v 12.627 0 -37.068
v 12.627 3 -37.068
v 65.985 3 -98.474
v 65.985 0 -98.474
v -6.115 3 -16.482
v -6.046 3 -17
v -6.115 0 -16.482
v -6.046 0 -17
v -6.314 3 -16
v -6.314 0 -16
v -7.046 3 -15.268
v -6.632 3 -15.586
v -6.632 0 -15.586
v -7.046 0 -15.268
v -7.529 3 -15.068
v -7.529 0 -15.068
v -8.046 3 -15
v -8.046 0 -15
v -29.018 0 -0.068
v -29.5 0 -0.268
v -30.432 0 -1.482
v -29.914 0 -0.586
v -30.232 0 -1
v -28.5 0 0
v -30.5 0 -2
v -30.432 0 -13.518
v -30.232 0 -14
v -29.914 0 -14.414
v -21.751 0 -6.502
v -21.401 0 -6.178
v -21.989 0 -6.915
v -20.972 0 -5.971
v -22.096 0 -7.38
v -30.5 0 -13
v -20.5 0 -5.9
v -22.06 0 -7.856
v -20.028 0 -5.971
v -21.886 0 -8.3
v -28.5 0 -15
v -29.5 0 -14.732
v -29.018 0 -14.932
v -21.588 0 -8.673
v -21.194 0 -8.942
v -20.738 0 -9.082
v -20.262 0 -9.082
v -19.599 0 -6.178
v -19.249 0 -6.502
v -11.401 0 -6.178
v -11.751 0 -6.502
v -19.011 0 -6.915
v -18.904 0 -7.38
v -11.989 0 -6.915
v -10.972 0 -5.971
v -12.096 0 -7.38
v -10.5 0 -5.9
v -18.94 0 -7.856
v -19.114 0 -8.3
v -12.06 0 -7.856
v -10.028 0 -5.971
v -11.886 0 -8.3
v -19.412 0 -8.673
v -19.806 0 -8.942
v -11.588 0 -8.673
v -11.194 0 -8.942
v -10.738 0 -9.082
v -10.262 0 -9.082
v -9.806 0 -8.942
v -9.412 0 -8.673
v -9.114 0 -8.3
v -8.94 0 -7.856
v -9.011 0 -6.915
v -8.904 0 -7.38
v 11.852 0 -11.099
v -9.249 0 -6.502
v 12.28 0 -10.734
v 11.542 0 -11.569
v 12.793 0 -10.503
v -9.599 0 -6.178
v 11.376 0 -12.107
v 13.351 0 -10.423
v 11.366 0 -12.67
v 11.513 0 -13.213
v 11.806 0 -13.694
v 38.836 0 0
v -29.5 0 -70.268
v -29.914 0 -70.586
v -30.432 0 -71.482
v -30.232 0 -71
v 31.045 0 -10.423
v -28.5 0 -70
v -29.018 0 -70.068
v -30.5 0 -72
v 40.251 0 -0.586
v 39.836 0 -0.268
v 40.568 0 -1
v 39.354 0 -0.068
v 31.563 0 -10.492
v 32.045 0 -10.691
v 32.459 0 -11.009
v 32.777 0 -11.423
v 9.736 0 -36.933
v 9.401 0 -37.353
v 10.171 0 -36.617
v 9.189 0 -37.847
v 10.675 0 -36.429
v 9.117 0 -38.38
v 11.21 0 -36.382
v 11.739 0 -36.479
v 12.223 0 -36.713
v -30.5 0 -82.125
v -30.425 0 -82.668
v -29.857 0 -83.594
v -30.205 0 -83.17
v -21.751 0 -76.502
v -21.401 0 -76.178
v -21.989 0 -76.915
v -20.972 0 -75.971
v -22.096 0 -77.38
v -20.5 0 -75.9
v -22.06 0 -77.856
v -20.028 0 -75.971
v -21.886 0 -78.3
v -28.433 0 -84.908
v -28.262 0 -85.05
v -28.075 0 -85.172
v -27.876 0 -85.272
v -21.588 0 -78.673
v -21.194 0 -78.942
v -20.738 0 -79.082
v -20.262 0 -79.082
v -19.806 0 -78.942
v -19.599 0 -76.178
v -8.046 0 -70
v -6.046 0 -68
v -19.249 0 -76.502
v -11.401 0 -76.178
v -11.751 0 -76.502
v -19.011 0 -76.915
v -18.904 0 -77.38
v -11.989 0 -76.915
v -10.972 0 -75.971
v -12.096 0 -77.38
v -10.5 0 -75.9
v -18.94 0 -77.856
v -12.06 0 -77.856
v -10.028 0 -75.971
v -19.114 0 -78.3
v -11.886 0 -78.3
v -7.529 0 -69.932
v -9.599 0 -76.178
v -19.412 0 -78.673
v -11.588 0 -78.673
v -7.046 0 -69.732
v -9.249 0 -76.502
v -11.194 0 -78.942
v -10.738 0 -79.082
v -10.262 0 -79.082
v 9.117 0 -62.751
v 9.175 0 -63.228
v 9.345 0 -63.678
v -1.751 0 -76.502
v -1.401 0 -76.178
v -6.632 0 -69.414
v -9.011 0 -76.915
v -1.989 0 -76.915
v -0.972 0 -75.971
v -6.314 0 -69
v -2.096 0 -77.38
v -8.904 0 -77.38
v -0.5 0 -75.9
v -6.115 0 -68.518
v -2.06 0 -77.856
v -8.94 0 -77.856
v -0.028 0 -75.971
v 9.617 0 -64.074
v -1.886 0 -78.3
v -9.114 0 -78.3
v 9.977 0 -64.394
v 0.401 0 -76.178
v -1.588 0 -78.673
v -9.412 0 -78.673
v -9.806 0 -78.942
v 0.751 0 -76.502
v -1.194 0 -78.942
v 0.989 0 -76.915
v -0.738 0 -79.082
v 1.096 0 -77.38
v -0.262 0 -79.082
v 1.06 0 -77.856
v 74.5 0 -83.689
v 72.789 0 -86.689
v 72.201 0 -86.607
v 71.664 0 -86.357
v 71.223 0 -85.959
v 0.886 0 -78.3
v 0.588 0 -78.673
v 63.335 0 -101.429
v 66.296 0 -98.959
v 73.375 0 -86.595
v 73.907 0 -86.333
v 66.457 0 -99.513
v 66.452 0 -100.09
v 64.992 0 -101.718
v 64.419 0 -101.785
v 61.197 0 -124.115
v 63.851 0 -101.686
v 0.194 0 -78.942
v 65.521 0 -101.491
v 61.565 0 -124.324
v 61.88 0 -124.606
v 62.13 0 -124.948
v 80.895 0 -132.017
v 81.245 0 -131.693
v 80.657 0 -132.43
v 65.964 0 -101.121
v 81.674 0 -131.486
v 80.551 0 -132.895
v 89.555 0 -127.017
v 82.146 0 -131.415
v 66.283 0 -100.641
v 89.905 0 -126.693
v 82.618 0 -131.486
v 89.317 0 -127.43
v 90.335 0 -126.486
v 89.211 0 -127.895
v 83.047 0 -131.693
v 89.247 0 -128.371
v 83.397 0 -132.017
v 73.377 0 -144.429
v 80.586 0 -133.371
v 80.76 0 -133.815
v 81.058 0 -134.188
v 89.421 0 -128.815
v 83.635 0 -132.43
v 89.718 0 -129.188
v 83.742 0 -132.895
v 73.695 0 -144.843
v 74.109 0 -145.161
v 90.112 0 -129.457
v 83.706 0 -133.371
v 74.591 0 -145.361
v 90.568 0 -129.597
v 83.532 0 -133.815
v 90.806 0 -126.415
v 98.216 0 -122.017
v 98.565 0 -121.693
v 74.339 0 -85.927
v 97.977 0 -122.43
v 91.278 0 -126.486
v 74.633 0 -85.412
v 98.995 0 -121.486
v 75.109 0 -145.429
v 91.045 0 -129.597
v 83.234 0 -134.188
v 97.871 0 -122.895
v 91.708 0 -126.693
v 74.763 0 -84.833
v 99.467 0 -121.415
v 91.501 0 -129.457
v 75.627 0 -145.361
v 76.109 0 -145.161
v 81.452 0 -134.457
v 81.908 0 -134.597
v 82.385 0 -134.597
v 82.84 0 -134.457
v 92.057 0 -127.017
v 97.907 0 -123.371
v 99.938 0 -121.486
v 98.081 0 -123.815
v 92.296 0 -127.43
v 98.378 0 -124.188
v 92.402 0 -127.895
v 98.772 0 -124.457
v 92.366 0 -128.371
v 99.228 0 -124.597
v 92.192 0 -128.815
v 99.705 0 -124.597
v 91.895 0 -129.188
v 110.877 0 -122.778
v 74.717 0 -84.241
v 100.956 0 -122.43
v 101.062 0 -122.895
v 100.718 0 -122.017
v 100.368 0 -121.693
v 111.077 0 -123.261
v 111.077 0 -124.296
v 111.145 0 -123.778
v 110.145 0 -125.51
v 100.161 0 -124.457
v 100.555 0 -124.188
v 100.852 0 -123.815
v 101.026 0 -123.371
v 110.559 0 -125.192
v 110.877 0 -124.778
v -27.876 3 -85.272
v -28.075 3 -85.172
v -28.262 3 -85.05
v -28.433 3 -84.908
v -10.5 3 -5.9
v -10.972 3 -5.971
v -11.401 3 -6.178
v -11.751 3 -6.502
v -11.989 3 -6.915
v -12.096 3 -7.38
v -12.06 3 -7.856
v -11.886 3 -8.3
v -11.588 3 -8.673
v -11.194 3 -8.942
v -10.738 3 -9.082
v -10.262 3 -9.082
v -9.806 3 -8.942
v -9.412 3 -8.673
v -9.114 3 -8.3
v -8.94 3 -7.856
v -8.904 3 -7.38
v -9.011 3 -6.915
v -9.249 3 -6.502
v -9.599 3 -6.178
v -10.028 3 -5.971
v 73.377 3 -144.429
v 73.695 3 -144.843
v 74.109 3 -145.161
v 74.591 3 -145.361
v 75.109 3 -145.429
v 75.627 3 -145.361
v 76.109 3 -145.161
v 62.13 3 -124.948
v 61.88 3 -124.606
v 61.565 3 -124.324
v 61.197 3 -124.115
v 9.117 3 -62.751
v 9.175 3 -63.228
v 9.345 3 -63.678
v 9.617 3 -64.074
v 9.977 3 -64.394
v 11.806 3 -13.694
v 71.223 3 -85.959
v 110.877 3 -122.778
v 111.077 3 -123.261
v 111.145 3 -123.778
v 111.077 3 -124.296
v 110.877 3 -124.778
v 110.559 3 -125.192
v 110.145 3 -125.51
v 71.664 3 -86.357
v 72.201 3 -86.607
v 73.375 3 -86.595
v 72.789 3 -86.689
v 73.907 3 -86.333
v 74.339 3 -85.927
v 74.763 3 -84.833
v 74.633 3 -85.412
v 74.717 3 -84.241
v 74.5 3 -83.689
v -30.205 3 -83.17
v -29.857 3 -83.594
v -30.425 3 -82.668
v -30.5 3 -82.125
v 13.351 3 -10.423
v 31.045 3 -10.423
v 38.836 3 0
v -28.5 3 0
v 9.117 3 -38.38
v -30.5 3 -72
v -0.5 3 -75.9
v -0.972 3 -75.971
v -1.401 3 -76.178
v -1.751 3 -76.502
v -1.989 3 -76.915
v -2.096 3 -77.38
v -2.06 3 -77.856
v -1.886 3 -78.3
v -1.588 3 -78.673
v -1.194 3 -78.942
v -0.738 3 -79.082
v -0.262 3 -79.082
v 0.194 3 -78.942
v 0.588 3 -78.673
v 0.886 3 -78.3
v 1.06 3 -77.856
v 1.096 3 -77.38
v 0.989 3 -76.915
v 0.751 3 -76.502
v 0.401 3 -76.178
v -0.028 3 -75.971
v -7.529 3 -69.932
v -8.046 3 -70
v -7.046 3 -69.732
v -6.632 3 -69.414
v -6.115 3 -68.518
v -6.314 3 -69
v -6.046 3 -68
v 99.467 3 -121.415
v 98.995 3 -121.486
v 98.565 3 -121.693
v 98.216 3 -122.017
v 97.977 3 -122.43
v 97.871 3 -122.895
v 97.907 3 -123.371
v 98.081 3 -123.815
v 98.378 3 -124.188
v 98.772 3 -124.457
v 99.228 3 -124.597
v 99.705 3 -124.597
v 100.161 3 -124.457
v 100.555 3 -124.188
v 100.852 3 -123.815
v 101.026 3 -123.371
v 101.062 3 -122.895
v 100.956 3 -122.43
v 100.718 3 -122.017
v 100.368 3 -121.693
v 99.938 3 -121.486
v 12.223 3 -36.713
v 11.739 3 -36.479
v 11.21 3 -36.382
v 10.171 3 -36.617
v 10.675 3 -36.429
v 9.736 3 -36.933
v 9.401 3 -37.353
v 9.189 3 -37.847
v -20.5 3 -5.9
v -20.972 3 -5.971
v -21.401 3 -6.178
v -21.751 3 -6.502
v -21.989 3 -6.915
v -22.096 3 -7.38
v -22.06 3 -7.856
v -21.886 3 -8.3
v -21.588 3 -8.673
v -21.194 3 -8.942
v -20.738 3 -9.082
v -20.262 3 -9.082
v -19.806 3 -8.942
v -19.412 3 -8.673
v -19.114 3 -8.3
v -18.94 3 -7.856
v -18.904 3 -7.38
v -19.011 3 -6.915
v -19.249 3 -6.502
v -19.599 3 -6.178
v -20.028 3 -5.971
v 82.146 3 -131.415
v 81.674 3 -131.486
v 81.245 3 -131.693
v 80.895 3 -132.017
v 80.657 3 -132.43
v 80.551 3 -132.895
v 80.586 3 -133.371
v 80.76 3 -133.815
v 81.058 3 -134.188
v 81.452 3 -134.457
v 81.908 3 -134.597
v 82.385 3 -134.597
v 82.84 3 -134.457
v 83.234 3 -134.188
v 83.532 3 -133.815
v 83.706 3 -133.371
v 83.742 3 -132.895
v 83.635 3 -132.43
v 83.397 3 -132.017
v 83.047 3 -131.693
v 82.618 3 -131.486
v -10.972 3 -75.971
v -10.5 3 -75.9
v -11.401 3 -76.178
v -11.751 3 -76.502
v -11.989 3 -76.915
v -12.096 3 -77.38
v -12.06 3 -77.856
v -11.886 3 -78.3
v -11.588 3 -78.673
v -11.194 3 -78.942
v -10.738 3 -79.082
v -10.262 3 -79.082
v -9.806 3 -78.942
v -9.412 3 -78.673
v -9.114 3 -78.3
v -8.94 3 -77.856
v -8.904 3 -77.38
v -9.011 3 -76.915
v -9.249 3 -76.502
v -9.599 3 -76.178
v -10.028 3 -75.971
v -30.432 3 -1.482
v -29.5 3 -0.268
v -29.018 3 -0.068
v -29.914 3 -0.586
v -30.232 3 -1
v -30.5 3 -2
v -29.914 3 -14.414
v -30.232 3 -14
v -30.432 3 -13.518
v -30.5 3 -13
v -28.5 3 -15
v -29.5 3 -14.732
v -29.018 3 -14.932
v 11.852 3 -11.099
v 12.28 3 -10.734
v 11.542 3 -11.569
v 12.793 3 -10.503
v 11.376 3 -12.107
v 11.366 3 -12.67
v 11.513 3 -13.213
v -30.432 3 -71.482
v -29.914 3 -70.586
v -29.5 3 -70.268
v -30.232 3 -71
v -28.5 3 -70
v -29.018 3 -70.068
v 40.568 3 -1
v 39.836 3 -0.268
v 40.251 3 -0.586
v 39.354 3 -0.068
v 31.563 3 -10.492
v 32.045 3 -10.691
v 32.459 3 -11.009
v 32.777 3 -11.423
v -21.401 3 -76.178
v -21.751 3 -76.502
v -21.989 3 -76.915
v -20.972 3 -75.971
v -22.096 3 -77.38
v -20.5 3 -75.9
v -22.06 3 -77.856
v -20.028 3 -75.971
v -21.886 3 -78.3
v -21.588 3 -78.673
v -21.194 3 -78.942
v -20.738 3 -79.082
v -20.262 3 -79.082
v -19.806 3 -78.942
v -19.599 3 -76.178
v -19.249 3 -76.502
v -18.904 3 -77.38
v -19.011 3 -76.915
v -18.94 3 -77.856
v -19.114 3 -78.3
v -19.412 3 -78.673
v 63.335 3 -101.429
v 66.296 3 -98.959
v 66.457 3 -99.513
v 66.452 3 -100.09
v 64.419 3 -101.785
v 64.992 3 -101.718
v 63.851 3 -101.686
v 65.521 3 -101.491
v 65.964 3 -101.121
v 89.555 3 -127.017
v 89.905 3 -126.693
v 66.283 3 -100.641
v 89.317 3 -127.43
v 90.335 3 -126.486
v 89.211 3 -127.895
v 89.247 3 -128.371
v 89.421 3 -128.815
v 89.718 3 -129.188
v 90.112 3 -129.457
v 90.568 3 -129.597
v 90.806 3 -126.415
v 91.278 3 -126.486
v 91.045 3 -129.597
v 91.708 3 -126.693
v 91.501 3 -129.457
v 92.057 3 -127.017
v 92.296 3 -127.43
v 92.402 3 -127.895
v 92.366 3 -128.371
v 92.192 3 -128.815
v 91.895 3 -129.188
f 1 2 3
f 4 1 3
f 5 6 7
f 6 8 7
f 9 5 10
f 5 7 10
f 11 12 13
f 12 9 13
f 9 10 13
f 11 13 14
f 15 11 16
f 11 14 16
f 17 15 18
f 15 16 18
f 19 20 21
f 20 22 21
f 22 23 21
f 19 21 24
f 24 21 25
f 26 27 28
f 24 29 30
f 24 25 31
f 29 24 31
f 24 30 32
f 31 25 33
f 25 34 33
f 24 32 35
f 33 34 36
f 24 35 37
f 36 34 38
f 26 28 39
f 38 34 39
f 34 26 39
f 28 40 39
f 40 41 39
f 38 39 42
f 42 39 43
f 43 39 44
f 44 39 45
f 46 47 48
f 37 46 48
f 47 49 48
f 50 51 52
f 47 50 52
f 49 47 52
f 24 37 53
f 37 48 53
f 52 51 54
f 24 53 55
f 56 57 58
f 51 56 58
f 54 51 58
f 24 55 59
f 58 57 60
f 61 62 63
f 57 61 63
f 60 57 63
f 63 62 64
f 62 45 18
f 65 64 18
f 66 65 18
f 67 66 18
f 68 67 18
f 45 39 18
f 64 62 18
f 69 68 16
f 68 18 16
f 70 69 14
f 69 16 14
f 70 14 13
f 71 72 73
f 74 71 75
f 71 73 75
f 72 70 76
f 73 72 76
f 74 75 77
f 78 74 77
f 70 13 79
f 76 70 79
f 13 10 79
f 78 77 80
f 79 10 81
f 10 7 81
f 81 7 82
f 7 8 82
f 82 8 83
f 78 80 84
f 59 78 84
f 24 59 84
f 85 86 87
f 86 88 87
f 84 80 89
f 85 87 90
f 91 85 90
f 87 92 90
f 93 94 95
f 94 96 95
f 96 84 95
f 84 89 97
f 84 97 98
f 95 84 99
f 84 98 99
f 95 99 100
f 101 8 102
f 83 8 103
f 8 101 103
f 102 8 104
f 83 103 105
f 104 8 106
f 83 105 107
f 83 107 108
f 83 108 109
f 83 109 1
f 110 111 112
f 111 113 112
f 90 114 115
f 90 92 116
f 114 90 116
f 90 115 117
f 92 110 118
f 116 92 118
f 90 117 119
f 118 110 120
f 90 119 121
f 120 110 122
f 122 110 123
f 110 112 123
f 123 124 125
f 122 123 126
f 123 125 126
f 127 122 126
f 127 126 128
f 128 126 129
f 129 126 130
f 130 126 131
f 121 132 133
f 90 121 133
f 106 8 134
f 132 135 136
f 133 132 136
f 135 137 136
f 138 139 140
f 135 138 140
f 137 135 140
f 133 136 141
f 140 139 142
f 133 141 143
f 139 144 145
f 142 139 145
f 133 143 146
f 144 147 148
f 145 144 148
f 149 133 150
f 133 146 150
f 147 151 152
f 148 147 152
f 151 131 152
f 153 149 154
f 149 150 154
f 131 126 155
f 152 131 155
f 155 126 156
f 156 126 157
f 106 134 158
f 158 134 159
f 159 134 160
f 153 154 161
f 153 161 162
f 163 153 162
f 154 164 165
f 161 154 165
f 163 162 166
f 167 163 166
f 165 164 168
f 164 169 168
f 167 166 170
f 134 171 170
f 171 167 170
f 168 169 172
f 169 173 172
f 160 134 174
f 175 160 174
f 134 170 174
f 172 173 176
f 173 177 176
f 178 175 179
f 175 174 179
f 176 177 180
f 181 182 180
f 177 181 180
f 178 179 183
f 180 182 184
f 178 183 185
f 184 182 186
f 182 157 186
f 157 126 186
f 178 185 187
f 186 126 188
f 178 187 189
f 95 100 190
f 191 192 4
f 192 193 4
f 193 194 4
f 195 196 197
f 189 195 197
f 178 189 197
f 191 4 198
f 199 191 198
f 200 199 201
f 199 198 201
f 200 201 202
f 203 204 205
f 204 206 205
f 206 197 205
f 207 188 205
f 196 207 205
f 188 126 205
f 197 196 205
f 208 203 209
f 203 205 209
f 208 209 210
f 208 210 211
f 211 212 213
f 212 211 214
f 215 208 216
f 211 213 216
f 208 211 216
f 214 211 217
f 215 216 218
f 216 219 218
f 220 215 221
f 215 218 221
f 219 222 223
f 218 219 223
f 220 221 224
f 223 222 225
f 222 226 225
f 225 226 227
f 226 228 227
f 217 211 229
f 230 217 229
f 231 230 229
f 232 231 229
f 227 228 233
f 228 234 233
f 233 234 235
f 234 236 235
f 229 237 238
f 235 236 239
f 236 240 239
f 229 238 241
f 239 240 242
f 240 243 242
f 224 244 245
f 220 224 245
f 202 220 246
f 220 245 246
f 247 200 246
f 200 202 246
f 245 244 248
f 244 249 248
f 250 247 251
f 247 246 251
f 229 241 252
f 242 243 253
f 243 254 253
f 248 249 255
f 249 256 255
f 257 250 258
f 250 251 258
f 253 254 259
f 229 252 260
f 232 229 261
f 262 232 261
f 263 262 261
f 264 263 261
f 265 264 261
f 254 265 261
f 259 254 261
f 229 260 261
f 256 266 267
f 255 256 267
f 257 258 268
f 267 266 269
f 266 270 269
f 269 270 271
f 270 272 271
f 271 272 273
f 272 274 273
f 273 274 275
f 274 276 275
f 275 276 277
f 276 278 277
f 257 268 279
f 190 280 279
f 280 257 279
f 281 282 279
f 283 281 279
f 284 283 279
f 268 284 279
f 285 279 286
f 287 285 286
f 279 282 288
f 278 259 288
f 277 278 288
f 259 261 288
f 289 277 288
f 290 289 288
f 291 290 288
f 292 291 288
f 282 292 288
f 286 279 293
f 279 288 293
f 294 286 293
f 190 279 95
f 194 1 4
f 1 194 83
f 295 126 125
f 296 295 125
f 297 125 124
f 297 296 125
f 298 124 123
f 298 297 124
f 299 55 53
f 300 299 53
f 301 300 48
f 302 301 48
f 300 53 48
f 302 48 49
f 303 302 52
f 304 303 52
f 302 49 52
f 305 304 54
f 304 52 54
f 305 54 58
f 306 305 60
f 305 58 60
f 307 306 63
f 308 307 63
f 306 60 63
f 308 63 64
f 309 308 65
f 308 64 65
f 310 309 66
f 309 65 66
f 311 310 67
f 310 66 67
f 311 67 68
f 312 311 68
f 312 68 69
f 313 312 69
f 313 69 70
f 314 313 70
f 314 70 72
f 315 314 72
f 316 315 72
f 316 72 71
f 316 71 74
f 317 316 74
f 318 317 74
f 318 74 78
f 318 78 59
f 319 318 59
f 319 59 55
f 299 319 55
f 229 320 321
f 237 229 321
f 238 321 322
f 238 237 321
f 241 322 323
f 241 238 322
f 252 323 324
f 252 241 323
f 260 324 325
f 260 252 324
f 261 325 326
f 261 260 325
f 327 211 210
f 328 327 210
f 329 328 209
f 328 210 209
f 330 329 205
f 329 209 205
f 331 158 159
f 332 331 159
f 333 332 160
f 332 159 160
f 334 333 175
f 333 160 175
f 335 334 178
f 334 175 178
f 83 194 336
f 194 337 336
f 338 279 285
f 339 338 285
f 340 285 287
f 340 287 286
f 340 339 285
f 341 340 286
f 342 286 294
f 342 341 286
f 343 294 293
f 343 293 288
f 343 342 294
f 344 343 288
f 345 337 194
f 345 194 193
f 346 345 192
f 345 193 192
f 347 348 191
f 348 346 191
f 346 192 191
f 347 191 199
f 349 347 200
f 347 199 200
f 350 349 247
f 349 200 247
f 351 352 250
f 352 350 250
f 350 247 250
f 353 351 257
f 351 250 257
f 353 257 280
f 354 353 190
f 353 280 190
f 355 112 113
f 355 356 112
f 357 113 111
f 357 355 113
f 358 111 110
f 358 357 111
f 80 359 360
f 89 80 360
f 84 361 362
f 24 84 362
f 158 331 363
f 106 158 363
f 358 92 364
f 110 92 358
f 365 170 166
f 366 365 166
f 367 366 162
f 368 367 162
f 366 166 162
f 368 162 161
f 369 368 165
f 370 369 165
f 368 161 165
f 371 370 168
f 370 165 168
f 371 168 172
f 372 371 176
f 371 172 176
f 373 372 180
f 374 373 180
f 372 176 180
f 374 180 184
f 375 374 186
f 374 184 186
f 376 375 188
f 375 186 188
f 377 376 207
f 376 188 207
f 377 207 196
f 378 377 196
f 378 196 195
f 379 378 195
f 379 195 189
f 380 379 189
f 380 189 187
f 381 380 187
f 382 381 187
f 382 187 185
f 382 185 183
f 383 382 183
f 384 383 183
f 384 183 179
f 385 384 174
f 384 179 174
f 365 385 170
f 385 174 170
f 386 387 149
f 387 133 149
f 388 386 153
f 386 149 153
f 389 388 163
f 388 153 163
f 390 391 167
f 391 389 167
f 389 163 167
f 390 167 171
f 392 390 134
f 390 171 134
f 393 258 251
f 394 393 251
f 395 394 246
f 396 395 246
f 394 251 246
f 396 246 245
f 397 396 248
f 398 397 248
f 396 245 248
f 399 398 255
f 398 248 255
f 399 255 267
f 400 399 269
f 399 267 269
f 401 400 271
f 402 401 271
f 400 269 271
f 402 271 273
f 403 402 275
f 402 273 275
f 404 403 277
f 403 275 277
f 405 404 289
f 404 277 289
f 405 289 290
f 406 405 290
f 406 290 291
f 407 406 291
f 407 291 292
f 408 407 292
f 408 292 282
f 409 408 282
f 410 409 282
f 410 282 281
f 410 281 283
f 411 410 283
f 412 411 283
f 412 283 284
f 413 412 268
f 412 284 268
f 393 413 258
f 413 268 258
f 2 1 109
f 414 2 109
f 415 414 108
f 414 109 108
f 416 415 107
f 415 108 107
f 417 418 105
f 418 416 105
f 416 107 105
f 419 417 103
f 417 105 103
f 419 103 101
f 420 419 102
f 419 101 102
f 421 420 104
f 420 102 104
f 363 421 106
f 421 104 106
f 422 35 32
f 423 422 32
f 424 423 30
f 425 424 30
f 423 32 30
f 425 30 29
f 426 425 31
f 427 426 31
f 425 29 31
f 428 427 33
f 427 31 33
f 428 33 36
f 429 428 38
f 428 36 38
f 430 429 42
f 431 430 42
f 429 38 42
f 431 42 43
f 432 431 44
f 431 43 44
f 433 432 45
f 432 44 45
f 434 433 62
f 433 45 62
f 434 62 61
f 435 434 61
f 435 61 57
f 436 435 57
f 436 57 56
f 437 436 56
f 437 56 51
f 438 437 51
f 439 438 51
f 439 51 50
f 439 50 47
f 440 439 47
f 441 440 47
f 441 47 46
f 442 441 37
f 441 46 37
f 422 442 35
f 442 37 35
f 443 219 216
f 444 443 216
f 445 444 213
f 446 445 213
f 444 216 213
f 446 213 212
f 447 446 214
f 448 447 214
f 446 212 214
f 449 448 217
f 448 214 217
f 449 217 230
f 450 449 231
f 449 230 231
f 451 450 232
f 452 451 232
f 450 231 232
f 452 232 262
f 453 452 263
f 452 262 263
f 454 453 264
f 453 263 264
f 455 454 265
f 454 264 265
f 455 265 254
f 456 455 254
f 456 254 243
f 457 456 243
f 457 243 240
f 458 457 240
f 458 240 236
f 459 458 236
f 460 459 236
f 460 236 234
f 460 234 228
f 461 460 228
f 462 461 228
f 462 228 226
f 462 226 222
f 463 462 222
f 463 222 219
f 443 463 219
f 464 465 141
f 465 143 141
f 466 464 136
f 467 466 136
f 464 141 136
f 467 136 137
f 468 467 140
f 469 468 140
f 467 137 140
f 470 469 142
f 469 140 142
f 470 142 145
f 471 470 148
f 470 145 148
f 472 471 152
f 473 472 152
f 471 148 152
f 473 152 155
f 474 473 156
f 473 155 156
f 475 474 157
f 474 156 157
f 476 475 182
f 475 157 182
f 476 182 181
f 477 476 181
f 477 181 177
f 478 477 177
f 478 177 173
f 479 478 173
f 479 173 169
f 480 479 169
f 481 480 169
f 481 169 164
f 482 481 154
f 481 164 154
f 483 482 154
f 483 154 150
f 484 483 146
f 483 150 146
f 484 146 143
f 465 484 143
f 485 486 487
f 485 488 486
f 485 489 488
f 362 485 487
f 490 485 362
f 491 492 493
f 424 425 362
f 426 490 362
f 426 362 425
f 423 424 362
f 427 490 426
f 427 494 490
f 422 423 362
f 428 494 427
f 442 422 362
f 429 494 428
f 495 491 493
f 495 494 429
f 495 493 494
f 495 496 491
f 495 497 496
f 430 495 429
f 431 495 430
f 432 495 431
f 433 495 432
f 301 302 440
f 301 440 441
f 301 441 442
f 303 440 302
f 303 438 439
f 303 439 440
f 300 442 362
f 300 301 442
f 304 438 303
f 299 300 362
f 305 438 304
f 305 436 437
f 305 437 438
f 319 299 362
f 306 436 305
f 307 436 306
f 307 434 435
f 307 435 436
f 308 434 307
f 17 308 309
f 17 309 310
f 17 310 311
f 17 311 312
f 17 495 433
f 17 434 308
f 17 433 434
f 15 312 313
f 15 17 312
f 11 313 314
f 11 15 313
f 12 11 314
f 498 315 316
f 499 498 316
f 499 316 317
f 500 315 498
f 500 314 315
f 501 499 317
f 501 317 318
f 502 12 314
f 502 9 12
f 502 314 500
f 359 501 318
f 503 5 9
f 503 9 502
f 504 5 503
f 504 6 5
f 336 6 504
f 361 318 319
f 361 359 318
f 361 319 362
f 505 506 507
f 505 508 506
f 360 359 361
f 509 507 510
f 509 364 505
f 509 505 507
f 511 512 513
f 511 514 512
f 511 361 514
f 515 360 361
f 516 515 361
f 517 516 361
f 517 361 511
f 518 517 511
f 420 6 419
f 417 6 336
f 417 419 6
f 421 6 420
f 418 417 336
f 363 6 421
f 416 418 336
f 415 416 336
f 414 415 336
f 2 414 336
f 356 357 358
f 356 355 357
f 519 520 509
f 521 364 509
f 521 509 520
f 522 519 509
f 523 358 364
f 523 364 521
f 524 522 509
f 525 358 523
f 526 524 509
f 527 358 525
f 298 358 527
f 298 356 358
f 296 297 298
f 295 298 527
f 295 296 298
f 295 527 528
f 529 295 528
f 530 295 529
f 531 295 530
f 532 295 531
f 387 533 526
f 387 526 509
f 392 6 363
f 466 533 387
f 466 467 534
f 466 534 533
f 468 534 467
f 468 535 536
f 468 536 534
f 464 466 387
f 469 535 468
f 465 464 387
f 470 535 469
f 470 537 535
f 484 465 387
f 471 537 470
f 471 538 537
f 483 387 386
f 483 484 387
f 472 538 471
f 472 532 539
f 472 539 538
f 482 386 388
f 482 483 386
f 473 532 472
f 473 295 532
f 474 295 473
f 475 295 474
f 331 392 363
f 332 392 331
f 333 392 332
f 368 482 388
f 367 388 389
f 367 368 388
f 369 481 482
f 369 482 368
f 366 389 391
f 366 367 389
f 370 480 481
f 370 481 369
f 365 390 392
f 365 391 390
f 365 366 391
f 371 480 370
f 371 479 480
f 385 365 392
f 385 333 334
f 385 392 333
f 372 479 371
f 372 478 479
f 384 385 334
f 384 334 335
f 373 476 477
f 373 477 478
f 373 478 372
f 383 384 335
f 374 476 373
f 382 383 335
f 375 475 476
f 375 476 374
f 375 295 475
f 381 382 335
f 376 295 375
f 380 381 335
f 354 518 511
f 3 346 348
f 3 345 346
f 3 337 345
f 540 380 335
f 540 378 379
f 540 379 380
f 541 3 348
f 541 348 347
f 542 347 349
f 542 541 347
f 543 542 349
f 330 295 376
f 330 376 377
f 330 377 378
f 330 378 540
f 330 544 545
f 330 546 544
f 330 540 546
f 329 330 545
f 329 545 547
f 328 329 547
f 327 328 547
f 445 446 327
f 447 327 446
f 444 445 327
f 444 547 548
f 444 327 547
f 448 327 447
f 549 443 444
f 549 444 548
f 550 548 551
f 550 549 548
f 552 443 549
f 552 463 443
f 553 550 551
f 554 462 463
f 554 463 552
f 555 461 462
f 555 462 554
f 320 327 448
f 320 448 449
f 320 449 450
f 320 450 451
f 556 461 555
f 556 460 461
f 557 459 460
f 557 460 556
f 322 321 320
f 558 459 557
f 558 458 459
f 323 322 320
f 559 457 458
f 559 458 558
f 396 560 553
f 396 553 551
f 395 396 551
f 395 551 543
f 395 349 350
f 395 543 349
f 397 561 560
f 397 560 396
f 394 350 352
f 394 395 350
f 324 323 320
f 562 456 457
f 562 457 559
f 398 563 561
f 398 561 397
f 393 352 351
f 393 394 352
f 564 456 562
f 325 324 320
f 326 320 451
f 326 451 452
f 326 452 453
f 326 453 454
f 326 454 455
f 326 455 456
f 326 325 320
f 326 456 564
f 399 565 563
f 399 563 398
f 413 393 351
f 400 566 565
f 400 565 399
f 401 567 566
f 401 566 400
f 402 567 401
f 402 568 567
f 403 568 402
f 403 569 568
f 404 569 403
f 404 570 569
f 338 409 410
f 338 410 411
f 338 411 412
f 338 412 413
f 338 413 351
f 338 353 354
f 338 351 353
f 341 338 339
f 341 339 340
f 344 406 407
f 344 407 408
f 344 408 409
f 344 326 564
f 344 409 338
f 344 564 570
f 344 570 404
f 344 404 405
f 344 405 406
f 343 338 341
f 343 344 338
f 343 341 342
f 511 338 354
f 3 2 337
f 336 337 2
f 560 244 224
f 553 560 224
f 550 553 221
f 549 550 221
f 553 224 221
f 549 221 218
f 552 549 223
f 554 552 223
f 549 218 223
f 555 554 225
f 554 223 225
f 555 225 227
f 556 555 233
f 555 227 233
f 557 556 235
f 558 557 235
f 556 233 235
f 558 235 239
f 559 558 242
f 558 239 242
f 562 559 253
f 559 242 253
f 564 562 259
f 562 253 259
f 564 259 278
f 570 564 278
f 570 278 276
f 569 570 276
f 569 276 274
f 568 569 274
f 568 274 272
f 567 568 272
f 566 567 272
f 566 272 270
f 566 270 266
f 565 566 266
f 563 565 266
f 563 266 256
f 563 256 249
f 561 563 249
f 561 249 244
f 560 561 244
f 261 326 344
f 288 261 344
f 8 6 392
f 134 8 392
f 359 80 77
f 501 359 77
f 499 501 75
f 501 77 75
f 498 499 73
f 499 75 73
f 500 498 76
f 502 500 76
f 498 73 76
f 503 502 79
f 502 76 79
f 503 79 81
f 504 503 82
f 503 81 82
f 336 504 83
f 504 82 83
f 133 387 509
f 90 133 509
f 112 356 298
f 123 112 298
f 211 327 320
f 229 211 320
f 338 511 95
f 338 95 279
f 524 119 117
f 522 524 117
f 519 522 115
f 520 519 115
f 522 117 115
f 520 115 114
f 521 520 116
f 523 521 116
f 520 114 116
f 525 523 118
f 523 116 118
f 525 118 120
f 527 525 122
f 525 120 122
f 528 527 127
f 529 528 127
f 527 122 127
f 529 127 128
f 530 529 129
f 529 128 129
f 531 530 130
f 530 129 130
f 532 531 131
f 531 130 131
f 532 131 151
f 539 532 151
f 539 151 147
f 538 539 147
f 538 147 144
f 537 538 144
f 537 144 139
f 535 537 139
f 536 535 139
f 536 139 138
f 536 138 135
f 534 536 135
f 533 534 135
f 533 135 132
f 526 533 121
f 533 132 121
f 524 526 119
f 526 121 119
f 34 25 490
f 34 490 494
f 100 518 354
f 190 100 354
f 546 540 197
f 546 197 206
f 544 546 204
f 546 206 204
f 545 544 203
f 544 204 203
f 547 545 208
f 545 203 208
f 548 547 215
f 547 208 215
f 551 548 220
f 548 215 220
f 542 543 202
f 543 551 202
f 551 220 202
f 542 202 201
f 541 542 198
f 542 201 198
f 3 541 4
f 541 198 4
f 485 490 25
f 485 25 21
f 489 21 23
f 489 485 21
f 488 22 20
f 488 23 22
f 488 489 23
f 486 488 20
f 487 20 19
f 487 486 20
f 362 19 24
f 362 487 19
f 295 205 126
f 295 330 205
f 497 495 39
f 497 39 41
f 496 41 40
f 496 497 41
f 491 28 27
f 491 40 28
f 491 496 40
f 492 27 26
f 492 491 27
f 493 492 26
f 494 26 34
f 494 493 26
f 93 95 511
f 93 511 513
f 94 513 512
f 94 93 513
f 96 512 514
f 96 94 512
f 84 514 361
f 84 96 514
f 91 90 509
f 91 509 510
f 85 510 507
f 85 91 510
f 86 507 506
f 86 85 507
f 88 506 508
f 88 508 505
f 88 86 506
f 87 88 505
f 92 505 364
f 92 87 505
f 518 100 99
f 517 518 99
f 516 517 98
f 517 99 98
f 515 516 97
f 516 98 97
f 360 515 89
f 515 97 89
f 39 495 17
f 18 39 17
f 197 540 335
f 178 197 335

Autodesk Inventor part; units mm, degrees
ref_plane "YZ Plane" through (0, 0, 0) normal (1, 0, 0) x (0, 1, 0)
ref_plane "XZ Plane" through (0, 0, 0) normal (0, 1, 0) x (-1, 0, 0)
ref_plane "XY Plane" through (0, 0, 0) normal (0, 0, 1) x (1, 0, 0)
sketch "スケッチ1" plane through (0, 0, 0) normal (0, 1, 0) x (-1, 0, 0)
  line L0 (0, 0) -> (30.5, 0)
  line L1 (30.5, 0) -> (30.5, -85)
  line L2 (30.5, -85) -> (0, -85)
  line L3 (0, -85) -> (0, 0)
  dimension "d0" = 30.5
  dimension "d1" = 85
extrude "押し出し1" add sketch "スケッチ1" along normal blind 3
sketch "スケッチ2" plane through (0, 3, 0) normal (0, 1, 0) x (1, 0, 0)
  line L0 (-30.5464, 15) -> (-6.0464, 15)
  line L1 (-6.0464, 15) -> (-6.0464, 70)
  line L2 (-6.0464, 70) -> (-30.5464, 70)
  line L3 (-30.5, 0) -> (0, 0) projected
  line L4 (-30.5464, 15) -> (-30.5464, 70)
  dimension "d4" = 24.5
  dimension "d5" = 55
  dimension "d6" = 90
  dimension "d7" = 15
extrude "押し出し2" cut sketch "スケッチ2" against normal blind 3
fillet "フィレット1" radius 2 4 edges at (-30.5, 1.5, 0) (-30.5, 1.5, -70) (-30.5, 1.5, -85) (-30.5, 1.5, -15)
fillet "フィレット2" radius 2 2 edges at (-6.0464, 1.5, -15) (-6.0464, 1.5, -70)
sketch "スケッチ3" plane through (0, 3, 0) normal (0, 1, 0) x (1, 0, 0)
  line L0 (-28.5, 0) -> (0, 0) projected
  line L1 (0, 0) -> (100, 0)
  line L2 (100, 0) -> (100, 85)
  line L3 (100, 85) -> (0, 85)
  line L4 (0, 85) -> (0, 0)
  dimension "d12" = 100
  dimension "d13" = 85
extrude "押し出し3" add sketch "スケッチ3" against normal blind 3
sketch "スケッチ4" plane through (0, 3, 0) normal (0, 1, 0) x (1, 0, 0)
  line L0 (100, 0) -> (100, 85) projected
  point P0 (0, 0)
  point P1 (40, 0)
  dimension "d16" = 60
sketch "スケッチ5" plane through (0, 3, 0) normal (0, 1, 0) x (1, 0, 0)
  line L0 (-28.5, 0) -> (100, 0) projected
  line L1 (39.9909, 0) -> (111.8004, 124.3777)
  line L2 (39.9909, 0) -> (183.6099, 0) construction
  line L3 (111.8004, 124.3777) -> (61.8004, 124.3777)
  line L4 (61.8004, 124.3777) -> (-28.5, 85)
  line L5 (-28.5, 85) -> (89.0656, 85)
  line L6 (100, 85) -> (-28.5, 85) projected
  point P0 (0, 0)
  dimension "d17" = 143.619
  dimension "d18" = 60
  dimension "d19" = 50
extrude "押し出し4" add sketch "スケッチ5" against normal blind 3
sketch "スケッチ6" plane through (0, 3, 0) normal (0, 1, 0) x (1, 0, 0)
  line L0 (111.8004, 124.3777) -> (61.8004, 124.3777) projected
  line L1 (111.8004, 124.3777) -> (111.8004, 0)
  line L2 (111.8004, 124.3777) -> (236.1781, 124.3777) construction
  line L3 (100, 0) -> (100, 85) projected
  line L4 (111.8004, 0) -> (100, 0)
  line L5 (100, 0) -> (100, 85)
  line L6 (100, 85) -> (89.0656, 85) projected
  line L7 (100, 85) -> (89.0656, 85)
  line L8 (89.0656, 85) -> (111.8004, 124.3777) projected
  line L9 (89.0656, 85) -> (111.8004, 124.3777)
  point P0 (0, 0)
  dimension "d22" = 90
extrude "押し出し5" add sketch "スケッチ6" against normal blind 3
sketch "スケッチ7" plane through (0, 3, 0) normal (0, 1, 0) x (1, 0, 0)
  line L0 (111.8004, 124.3777) -> (111.8004, 0) projected
  line L1 (111.8004, 109.3777) -> (39.991, 0)
  line L2 (-28.5, 0) -> (111.8004, 0) projected
  line L3 (111.8004, 0) -> (111.8004, 109.3777)
  line L4 (111.8004, 0) -> (39.991, 0)
  point P0 (0, 0)
  dimension "d25" = 15
extrude "押し出し6" cut sketch "スケッチ7" against normal blind 3
sketch "スケッチ8" plane through (0, 3, 0) normal (0, 1, 0) x (1, 0, 0)
  line L0 (111.8004, 109.3777) -> (111.8004, 124.3777) projected
  point P0 (0, 0)
  point P1 (111.8004, 116.8777)
sketch "スケッチ9" plane through (0, 3, 0) normal (0, 1, 0) x (1, 0, 0)
  point P0 (0, 0)
sketch "スケッチ10" plane through (0, 3, 0) normal (0, 1, 0) x (1, 0, 0)
  line L0 (111.8004, 109.3777) -> (39.991, 0) projected
  line L1 (61.8004, 124.3777) -> (111.8004, 124.3777) projected
  line L2 (39.991, 0) -> (111.8004, 124.3777)
  line L3 (111.8004, 109.3777) -> (111.8004, 124.3777) projected
  line L4 (111.8004, 124.3777) -> (111.8004, 109.3777)
  line L5 (111.8004, 109.3777) -> (39.991, 0)
  point P0 (0, 0)
extrude "押し出し7" cut sketch "スケッチ10" against normal blind 3
sketch "スケッチ11" plane through (0, 3, 0) normal (0, 1, 0) x (1, 0, 0)
  line L0 (61.8004, 124.3777) -> (74.3769, 146.1608)
  line L1 (61.8004, 124.3777) -> (86.9534, 124.3777) construction
  line L2 (74.3769, 146.1608) -> (112.1064, 124.3777)
  line L3 (111.8004, 124.3777) -> (61.8004, 124.3777) projected
  line L4 (112.1064, 124.3777) -> (61.8004, 124.3777)
  point P0 (0, 0)
  dimension "d32" = 25.153
  dimension "d33" = 60
extrude "押し出し8" add sketch "スケッチ11" against normal blind 3
fillet "フィレット3" radius 2 2 edges at (112.1064, 1.5, -124.3777) (111.8004, 1.5, -124.3777)
fillet "フィレット4" radius 2 3 edges at (74.3769, 1.5, -146.1608) (61.8004, 1.5, -124.3777) (39.991, 1.5, 0)
sketch "スケッチ12" plane through (0, 3, 0) normal (0, 1, 0) x (1, 0, 0)
  circle A0 centre (99.4666, 123.015) radius 1.6
  line L0 (110.1448, 125.5102) -> (76.1089, 145.1608) projected
  line L1 (40.5683, 1) -> (110.8769, 122.7782) projected
  circle A1 centre (89.4666, 128.7885) radius 1.6
  circle A2 centre (79.4666, 134.562) radius 1.6
  point P0 (0, 0)
  dimension "d38" = 3.2
  dimension "d39" = 7.5
  dimension "d40" = 10
  dimension "d41" = 3.2
  dimension "d42" = 3.2
  dimension "d43" = 10
  dimension "d44" = 7.5
  dimension "d45" = 7.5
  dimension "d46" = 10
hole "穴1" at (99.4666, 3, -123.015) at (89.4666, 3, -128.7885) at (79.4666, 3, -134.562) direction (0, -1, 0) diameter 3.2 depth 3.048
fillet "フィレット5" radius 2 1 edges at (-28.5, 1.5, -85)
sketch "スケッチ13" plane through (0, 3, 0) normal (0, 1, 0) x (1, 0, 0)
  line L0 (-30.5, 83) -> (-30.5, 72) projected
  line L1 (-28.1853, 85.1373) -> (61.1969, 124.1146) projected
  line L2 (-30.5, 83) -> (-28.1853, 85.1373)
  line L3 (-28.1853, 85.1373) -> (-30.5, 84.8107)
  arc A0 (-28.7424, 84.9853) -> (-30.5, 83) centre (-28.5, 83) ccw projected
  line L4 (-30.5, 84.8107) -> (-30.5, 83)
  point P0 (0, 0)
extrude "押し出し9" cut sketch "スケッチ13" against normal blind 3
fillet "フィレット6" radius 2 2 edges at (-28.1853, 1.5, -85.1373) (-30.5, 1.5, -83)
sketch "スケッチ14" plane through (0, 3, 0) normal (0, 1, 0) x (1, 0, 0)
  circle A0 centre (-20.5, 77.5) radius 1.6
  line L0 (-30.5, 82.1245) -> (-30.5, 72) projected
  line L1 (-28.5, 70) -> (-8.0464, 70) projected
  circle A1 centre (-10.5, 77.5) radius 1.6
  circle A2 centre (-0.5, 77.5) radius 1.6
  circle A3 centre (-20.5, 7.5) radius 1.6
  line L2 (-8.0464, 15) -> (-28.5, 15) projected
  line L3 (-30.5, 13) -> (-30.5, 2) projected
  circle A4 centre (-10.5, 7.5) radius 1.6
  point P0 (0, 0)
  dimension "d58" = 3.2
  dimension "d59" = 10
  dimension "d60" = 7.5
  dimension "d61" = 3.2
  dimension "d62" = 3.2
  dimension "d63" = 10
  dimension "d64" = 7.5
  dimension "d65" = 10
  dimension "d66" = 7.5
  dimension "d67" = 3.2
  dimension "d68" = 7.5
  dimension "d69" = 10
  dimension "d70" = 3.2
  dimension "d71" = 10
  dimension "d72" = 7.5
hole "穴2" at (-20.5, 3, -7.5) at (-10.5, 3, -7.5) at (-20.5, 3, -77.5) at (-10.5, 3, -77.5) at (-0.5, 3, -77.5) direction (0, -1, 0) diameter 3.2 depth 3.048
sketch "スケッチ15" plane through (0, 3, 0) normal (0, 1, 0) x (1, 0, 0)
  line L0 (32.1999, 10.4234) -> (86.628, 104.6956)
  line L1 (32.1999, 10.4234) -> (141.0561, 10.4234) construction
  line L2 (86.628, 104.6956) -> (9.117, 10.4234)
  line L3 (9.117, 10.4234) -> (32.1999, 10.4234)
  line L4 (9.117, 33.0287) -> (76.4814, 110.5538)
  line L5 (76.4814, 110.5538) -> (9.117, 63.797)
  line L6 (9.117, 63.797) -> (9.117, 33.0287)
  point P0 (0, 0)
  dimension "d80" = 60
extrude "押し出し10" cut sketch "スケッチ15" against normal blind 3
fillet "フィレット7" radius 2 6 edges at (9.117, 1.5, -63.797) (9.117, 1.5, -10.4234) (32.1999, 1.5, -10.4234) (9.117, 1.5, -33.0287) (76.4814, 1.5, -110.5538) (86.628, 1.5, -104.6956)
sketch "スケッチ16" plane through (0, 3, 0) normal (0, 1, 0) x (1, 0, 0)
  circle A0 centre (99.4666, 123.015) radius 1.6 projected
  circle A1 centre (99.4666, 123.015) radius 1.6
  circle A2 centre (89.4666, 128.7885) radius 1.6 projected
  circle A3 centre (89.4666, 128.7885) radius 1.6
  circle A4 centre (79.4666, 134.562) radius 1.6 projected
  circle A5 centre (79.4666, 134.562) radius 1.6
  point P0 (0, 0)
  dimension "d84" = 3.2
  dimension "d85" = 3.2
  dimension "d86" = 3.2
extrude "押し出し11" add sketch "スケッチ16" against normal blind 3
sketch "スケッチ17" plane through (0, 3, 0) normal (0, 1, 0) x (1, 0, 0)
  circle A0 centre (99.4666, 123.015) radius 1.6
  line L0 (110.1448, 125.5102) -> (76.1089, 145.1608) projected
  line L1 (40.5683, 1) -> (110.8769, 122.7782) projected
  circle A1 centre (90.8064, 128.015) radius 1.6
  circle A2 centre (82.1461, 133.015) radius 1.6
  point P0 (0, 0)
  dimension "d89" = 3.2
  dimension "d90" = 7.5
  dimension "d91" = 10
  dimension "d92" = 3.2
  dimension "d93" = 3.2
  dimension "d95" = 7.5
  dimension "d97" = 7.5
  dimension "d98" = 20
  dimension "d99" = 30
hole "穴3" at (82.1461, 3, -133.015) at (90.8064, 3, -128.015) at (99.4666, 3, -123.015) direction (0, -1, 0) diameter 3.2 depth 3.048
equation "\"d52\" = Thickness"
equation "\"d78\" = Thickness"
equation "\"d105\" = Thickness"
equation "\"BendRadius\" = Thickness"
equation "\"BendReliefWidth\" = Thickness"
equation "\"BendReliefDepth\" = 0.5 * Thickness"
equation "\"CornerReliefSize\" = 4 * Thickness"
equation "\"MinimumRemnant\" = 2 * Thickness"
equation "\"TransitionRadius\" = BendRadius"
equation "\"JacobiRadiusSize\" = BendRadius"
equation "\"GapSize\" = Thickness"
equation "\"Thickness\" = 3.048"
properties part number "オムニ_前2_N"
